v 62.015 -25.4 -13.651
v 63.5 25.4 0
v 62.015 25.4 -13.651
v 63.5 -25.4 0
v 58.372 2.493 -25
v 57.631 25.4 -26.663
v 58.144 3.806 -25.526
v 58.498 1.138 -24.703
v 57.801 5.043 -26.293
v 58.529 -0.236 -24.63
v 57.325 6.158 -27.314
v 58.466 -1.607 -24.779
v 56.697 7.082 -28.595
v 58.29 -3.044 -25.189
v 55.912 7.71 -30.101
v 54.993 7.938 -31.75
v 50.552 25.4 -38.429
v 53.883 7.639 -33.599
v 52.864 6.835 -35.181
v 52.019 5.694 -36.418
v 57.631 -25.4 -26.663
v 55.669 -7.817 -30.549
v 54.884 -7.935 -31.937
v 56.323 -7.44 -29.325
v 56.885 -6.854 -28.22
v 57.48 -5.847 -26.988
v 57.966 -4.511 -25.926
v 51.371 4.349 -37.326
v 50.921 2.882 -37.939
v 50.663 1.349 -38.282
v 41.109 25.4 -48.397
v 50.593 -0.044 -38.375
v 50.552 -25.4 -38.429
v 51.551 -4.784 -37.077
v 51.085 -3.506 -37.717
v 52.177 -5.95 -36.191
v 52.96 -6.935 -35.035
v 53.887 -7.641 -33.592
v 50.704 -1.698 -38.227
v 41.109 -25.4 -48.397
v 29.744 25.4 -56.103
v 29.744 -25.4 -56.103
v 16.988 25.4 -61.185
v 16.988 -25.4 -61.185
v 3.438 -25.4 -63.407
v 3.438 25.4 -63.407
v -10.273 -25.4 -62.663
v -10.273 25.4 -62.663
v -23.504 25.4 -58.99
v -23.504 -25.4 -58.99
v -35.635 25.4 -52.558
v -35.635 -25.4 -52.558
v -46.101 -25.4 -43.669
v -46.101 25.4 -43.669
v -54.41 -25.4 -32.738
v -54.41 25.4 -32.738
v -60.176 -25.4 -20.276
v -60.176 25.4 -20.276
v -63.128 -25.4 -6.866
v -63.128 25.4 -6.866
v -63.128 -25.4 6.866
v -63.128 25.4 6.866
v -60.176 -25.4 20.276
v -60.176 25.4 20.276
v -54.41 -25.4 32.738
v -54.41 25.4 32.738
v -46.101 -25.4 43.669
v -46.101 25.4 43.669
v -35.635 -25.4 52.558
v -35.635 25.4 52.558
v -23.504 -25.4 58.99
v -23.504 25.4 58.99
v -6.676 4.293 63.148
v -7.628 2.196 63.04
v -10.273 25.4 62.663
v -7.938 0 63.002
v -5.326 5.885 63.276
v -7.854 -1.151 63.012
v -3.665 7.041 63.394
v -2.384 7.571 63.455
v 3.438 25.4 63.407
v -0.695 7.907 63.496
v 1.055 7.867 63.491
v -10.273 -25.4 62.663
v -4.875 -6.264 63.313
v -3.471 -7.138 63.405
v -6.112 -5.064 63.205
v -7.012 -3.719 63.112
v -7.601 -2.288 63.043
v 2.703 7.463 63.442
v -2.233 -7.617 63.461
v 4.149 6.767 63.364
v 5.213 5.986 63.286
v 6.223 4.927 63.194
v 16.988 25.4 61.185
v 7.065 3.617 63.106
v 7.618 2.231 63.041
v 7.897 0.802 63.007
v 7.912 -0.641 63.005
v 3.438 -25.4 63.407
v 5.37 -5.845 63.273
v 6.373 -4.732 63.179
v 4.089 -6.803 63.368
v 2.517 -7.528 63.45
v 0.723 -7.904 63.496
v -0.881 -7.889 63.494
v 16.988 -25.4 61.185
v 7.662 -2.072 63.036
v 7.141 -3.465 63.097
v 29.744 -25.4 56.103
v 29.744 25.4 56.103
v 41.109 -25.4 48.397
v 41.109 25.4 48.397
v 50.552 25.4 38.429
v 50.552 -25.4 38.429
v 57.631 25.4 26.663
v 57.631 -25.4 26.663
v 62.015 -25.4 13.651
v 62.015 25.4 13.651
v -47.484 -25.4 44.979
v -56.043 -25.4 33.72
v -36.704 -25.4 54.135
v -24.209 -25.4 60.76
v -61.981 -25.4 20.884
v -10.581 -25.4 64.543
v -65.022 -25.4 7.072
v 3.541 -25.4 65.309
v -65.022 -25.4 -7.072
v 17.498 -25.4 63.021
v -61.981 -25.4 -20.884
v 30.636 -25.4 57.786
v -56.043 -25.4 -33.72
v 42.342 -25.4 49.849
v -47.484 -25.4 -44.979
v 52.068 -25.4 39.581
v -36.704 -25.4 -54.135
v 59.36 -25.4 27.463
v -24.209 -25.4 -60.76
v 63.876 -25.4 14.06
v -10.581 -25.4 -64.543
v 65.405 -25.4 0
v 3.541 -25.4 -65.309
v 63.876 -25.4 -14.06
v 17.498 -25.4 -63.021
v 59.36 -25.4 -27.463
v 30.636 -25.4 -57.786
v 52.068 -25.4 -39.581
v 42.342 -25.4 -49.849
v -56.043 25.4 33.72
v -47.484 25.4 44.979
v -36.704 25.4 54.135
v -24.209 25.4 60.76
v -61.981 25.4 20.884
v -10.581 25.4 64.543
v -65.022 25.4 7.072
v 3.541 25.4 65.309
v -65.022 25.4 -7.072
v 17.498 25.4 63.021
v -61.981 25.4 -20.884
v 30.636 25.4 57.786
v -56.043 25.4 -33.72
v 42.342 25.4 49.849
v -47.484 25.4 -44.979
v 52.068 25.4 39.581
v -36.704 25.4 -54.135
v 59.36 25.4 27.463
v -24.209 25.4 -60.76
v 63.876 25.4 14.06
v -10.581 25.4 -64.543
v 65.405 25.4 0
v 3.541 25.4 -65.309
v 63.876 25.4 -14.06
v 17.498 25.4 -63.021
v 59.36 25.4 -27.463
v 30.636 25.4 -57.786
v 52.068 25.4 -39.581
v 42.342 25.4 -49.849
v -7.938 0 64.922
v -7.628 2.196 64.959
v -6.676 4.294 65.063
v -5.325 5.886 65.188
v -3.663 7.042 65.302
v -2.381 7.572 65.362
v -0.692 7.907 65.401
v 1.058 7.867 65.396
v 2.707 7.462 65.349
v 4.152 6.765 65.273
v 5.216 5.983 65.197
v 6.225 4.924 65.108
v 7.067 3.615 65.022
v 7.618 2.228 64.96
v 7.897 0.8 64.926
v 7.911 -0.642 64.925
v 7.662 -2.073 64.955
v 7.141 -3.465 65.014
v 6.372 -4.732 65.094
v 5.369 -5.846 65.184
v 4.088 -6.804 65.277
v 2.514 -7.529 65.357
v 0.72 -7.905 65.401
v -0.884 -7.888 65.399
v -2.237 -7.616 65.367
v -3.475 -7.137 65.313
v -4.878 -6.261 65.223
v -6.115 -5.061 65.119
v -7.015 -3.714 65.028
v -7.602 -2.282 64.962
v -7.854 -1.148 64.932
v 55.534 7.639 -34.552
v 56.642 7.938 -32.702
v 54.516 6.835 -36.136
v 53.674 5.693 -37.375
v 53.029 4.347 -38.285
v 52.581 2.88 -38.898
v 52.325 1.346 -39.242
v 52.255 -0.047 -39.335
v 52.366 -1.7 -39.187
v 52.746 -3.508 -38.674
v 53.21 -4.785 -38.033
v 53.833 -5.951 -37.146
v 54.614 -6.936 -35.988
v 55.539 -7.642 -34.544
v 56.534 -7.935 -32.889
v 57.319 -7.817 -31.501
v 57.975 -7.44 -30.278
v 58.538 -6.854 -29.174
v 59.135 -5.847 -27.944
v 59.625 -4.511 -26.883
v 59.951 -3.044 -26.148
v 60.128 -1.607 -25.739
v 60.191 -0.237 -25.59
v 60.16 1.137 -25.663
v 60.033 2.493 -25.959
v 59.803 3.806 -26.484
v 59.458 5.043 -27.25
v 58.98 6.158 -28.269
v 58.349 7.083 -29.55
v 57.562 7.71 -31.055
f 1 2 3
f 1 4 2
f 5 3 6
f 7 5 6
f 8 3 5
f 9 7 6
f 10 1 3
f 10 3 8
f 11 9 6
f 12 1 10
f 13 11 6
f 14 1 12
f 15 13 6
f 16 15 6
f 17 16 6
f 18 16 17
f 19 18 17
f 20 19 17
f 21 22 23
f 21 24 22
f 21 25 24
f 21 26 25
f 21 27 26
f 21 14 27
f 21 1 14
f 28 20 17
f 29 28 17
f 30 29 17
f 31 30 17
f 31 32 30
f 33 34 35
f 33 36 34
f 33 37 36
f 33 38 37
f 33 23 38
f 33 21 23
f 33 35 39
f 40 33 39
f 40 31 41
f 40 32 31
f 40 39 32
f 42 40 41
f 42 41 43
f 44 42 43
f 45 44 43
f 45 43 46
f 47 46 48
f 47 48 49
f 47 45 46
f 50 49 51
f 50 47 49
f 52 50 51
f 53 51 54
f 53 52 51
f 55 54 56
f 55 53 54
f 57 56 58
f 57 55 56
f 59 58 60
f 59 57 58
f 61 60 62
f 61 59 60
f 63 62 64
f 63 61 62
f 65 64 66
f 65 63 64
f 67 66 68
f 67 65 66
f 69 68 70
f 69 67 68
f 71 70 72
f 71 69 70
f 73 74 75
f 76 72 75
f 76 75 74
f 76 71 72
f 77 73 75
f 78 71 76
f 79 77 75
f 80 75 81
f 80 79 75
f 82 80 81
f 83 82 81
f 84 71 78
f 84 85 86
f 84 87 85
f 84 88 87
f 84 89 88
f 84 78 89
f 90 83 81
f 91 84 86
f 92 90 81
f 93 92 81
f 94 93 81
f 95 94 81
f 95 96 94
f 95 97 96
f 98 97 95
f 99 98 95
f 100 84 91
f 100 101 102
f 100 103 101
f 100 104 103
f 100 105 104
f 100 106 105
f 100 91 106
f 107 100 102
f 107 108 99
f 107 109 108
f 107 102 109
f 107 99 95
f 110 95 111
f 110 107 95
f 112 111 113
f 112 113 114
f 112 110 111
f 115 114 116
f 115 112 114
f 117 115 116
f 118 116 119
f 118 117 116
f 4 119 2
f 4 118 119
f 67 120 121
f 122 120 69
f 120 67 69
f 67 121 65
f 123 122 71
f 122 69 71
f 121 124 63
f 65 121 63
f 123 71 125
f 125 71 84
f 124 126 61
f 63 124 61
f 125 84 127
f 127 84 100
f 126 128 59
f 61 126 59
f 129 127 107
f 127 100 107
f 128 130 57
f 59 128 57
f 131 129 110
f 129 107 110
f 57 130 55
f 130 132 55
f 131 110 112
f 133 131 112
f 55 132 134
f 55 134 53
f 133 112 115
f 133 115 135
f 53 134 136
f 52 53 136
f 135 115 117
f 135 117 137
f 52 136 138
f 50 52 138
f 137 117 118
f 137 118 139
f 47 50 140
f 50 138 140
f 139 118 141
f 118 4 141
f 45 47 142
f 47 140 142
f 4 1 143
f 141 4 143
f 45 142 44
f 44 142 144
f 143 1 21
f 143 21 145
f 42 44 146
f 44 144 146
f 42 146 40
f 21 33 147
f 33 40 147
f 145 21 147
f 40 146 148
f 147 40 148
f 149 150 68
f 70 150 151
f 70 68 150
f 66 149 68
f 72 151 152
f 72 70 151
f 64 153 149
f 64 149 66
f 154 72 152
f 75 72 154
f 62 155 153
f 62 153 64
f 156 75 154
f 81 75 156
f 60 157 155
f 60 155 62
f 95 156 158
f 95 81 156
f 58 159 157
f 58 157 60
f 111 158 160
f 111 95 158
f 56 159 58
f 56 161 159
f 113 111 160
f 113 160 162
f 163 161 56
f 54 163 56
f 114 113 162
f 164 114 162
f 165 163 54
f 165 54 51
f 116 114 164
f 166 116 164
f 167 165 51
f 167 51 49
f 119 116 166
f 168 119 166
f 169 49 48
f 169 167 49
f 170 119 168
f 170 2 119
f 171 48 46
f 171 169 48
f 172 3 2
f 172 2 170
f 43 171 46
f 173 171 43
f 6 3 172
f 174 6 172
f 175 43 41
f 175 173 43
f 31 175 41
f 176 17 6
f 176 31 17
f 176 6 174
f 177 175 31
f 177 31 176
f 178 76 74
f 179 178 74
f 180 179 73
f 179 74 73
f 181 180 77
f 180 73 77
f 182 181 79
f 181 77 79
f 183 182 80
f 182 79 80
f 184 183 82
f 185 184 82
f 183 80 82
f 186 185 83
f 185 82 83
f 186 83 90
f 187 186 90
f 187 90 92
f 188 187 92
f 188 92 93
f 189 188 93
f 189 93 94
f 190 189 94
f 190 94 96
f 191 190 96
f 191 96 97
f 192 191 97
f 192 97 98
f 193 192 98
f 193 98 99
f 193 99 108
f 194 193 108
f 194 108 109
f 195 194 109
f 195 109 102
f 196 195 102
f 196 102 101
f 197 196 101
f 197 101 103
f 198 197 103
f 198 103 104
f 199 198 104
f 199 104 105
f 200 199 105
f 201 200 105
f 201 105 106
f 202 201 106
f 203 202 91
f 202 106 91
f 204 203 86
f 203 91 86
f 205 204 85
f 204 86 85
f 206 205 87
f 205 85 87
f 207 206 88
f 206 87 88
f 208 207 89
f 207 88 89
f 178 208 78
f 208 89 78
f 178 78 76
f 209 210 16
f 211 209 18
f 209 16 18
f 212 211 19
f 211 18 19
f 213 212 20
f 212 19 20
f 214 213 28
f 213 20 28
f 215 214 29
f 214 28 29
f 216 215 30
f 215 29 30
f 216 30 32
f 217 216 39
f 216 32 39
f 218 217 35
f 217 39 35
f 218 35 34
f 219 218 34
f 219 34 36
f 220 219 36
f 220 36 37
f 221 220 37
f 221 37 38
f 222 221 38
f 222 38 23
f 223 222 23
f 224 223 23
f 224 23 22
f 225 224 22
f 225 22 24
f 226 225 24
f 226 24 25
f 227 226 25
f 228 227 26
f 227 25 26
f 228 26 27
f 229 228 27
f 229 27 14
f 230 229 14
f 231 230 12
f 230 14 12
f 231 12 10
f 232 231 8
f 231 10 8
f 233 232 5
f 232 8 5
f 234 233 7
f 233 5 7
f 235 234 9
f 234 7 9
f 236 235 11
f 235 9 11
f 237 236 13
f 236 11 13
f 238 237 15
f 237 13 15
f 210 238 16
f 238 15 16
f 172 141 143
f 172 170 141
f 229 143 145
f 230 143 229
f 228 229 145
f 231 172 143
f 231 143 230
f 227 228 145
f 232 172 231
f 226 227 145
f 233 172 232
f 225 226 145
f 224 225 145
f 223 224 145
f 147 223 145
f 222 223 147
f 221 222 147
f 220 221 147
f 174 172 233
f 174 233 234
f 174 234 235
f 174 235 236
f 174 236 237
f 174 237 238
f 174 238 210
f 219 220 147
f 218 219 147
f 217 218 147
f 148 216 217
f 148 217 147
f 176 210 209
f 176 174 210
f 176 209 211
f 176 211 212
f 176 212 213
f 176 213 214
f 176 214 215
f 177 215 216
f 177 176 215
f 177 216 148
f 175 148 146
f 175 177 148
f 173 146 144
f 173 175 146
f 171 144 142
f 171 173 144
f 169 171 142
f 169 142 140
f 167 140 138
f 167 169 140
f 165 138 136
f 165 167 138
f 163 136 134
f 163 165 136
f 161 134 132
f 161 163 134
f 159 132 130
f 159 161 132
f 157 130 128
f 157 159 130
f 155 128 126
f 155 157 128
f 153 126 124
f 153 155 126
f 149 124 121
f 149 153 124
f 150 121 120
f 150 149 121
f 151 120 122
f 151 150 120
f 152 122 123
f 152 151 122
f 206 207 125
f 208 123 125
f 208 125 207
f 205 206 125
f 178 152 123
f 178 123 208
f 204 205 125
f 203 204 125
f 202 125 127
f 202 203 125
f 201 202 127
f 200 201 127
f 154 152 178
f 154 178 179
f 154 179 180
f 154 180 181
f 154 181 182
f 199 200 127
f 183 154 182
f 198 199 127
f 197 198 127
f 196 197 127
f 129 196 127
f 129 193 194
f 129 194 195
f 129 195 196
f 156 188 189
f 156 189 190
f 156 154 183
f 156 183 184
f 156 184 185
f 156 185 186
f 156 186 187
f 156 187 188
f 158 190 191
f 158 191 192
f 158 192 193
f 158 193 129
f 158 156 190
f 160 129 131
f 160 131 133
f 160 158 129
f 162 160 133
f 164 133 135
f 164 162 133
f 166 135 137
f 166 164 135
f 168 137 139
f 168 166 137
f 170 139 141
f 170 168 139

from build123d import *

# Parameters (mm, degrees)
SKETCH1_R                        = 65.405
SKETCH1_R_2                      = 63.5
BOSS_EXTRUDE1_DEPTH              = 25.4
F_5_8_0_625_DIAMETER_HOLE1_D     = 15.875
F_5_8_0_625_DIAMETER_HOLE1_DEPTH = 3.81
F_5_8_0_625_DIAMETER_HOLE2_D     = 15.875
F_5_8_0_625_DIAMETER_HOLE2_DEPTH = 3.81


with BuildPart() as part:
    # Sketch1 → Boss-Extrude1 (new body, symmetric)
    with BuildSketch(Plane(origin=(0, 0, 0), x_dir=(1, 0, 0), z_dir=(0, 1, 0))):
        Circle(SKETCH1_R)
        Circle(SKETCH1_R_2, mode=Mode.SUBTRACT)
    extrude(amount=BOSS_EXTRUDE1_DEPTH, both=True)

    # 5/8 (0.625) Diameter Hole1
    with Locations(Plane(origin=(56.642391535, 0, -32.7025), x_dir=(0, -1, 0), z_dir=(0.866025404, 0, -0.5))):
        with Locations((0, 0)):
            Hole(F_5_8_0_625_DIAMETER_HOLE1_D / 2, depth=F_5_8_0_625_DIAMETER_HOLE1_DEPTH)

    # 5/8 (0.625) Diameter Hole2
    with Locations(Plane.XY.offset(65.405)):
        with Locations((0, 0)):
            Hole(F_5_8_0_625_DIAMETER_HOLE2_D / 2, depth=F_5_8_0_625_DIAMETER_HOLE2_DEPTH)


solid = part.part
